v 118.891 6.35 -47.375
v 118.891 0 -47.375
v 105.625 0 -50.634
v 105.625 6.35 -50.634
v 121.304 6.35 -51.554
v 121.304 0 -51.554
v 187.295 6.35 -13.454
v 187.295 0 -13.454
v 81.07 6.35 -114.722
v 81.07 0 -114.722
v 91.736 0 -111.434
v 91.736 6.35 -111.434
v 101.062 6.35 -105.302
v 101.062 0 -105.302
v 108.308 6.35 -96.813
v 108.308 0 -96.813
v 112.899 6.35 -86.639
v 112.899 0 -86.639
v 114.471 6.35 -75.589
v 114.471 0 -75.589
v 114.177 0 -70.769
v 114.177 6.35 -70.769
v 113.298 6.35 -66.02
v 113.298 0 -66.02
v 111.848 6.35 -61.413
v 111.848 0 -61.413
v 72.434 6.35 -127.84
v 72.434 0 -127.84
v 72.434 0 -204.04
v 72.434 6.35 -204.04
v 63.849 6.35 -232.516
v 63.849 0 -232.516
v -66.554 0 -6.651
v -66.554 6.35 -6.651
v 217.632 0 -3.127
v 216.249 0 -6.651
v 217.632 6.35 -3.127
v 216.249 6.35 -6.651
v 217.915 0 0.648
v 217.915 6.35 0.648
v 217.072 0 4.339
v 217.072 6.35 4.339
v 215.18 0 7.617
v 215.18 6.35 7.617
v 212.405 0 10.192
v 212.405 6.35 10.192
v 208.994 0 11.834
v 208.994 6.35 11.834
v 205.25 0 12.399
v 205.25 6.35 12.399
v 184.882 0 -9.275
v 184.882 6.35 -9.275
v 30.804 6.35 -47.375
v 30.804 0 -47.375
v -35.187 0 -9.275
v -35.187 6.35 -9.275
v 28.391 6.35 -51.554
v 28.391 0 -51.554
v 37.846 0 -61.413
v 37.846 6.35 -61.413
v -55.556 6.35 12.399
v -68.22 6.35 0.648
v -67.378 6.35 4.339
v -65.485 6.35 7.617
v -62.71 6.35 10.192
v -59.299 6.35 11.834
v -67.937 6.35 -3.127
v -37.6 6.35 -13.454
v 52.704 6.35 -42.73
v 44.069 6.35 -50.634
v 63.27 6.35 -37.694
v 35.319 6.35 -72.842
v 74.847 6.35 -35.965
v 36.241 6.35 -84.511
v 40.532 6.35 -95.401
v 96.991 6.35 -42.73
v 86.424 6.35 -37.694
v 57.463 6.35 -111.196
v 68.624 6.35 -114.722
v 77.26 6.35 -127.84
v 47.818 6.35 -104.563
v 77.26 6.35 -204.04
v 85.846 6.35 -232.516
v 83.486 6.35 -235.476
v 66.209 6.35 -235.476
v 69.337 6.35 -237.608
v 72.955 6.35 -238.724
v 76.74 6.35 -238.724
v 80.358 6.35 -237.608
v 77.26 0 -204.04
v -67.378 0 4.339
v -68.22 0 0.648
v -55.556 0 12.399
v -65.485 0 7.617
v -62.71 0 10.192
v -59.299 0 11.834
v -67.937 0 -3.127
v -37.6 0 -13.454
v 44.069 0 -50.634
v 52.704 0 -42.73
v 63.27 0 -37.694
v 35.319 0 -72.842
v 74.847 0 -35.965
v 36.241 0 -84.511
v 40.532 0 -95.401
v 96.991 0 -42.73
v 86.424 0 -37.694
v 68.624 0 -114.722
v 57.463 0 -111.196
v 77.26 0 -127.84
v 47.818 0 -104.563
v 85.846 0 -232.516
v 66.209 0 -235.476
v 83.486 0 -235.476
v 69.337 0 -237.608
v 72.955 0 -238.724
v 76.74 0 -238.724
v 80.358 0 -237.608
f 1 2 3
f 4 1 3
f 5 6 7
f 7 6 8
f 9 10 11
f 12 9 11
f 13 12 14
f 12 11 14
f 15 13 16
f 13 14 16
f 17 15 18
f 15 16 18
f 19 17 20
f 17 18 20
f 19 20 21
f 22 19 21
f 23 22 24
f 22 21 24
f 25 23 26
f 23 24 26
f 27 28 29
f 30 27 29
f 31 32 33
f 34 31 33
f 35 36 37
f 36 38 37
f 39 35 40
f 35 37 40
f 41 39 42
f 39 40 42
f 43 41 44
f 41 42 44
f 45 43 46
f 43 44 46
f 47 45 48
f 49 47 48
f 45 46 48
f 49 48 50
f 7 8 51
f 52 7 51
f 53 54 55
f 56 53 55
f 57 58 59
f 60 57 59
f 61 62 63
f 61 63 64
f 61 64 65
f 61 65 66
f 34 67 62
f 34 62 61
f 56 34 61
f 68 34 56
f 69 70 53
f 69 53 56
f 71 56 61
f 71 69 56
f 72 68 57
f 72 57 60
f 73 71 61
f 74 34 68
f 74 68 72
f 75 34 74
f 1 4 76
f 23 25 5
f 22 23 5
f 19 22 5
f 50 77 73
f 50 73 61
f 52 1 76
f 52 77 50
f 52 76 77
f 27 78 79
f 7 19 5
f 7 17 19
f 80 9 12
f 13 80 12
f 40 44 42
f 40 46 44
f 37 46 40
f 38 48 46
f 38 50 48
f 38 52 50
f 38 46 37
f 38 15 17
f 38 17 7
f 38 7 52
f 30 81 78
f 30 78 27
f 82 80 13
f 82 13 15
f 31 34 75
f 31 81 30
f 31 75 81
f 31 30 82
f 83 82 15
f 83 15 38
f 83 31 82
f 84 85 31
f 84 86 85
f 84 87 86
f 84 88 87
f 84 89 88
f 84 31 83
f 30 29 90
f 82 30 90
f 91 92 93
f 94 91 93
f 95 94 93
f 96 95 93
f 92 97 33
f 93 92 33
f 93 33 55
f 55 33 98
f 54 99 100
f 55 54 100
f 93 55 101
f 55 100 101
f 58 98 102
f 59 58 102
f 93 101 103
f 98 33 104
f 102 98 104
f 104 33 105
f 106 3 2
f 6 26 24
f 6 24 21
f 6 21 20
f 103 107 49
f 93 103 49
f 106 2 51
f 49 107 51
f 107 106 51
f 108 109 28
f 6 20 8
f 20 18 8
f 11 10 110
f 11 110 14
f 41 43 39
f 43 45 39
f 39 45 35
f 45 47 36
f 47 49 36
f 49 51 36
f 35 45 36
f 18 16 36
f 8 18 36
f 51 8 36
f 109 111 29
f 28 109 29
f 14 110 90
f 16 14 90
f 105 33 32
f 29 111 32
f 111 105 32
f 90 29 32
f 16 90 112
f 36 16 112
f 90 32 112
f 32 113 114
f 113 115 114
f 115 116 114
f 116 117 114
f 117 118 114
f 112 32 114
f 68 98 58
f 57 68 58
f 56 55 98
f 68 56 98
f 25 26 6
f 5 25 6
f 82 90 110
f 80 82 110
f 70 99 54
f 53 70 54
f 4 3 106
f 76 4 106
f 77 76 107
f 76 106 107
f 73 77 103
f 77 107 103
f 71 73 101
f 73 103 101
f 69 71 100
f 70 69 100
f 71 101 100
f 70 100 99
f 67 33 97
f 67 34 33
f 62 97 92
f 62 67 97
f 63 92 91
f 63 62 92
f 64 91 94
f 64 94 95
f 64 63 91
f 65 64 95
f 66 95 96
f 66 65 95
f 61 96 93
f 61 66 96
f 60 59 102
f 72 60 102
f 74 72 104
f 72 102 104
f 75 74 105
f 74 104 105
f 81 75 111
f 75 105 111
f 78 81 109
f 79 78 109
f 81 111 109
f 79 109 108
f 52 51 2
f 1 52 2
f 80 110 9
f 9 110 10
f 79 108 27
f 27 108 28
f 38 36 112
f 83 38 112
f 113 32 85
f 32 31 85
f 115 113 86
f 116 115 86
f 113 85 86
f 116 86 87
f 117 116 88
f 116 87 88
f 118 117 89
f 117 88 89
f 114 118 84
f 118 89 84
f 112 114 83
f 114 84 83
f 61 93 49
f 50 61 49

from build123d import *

# Parameters (mm, degrees)
BOSS_EXTRUDE1_DEPTH = 6.35
FILLET1_R           = 12.7


with BuildPart() as part:
    # Sketch1 → Boss-Extrude1 (new body)
    with BuildSketch(Plane(origin=(0, 0, 0), x_dir=(1, 0, 0), z_dir=(0, 1, 0))):
        Polygon((74.847393185, 251.565850448), (-77.552606815, -12.398692626), (227.247393185, -12.398692626), align=None)
        with BuildLine():
            Line((68.624393185, 114.721772347), (72.434393185, 127.839947397))
            Line((72.434393185, 127.839947397), (72.434393185, 204.039947397))
            Line((72.434393185, 204.039947397), (77.260393185, 204.039947397))
            Line((77.260393185, 204.039947397), (77.260393185, 127.839947397))
            Line((77.260393185, 127.839947397), (81.070393185, 114.721772347))
            ThreePointArc((81.070393185, 114.721772347), (104.985753525, 101.313807865), (114.471393185, 75.589488399))
            ThreePointArc((114.471393185, 75.589488399), (113.810138601, 68.380754416), (111.848445192, 61.412622513))
            Line((111.848445192, 61.412622513), (121.304118037, 51.553978199))
            Line((121.304118037, 51.553978199), (187.295253805, 13.453978199))
            Line((187.295253805, 13.453978199), (184.882253805, 9.2745396))
            Line((184.882253805, 9.2745396), (118.891118037, 47.3745396))
            Line((118.891118037, 47.3745396), (105.625445192, 50.634070337))
            ThreePointArc((105.625445192, 50.634070337), (74.847393185, 35.965488399), (44.069341177, 50.634070337))
            Line((44.069341177, 50.634070337), (30.803668332, 47.3745396))
            Line((30.803668332, 47.3745396), (-35.187467436, 9.2745396))
            Line((-35.187467436, 9.2745396), (-37.600467436, 13.453978199))
            Line((-37.600467436, 13.453978199), (28.390668332, 51.553978199))
            Line((28.390668332, 51.553978199), (37.846341177, 61.412622512))
            ThreePointArc((37.846341177, 61.412622512), (40.532002585, 95.401488399), (68.624393185, 114.721772347))
        make_face(mode=Mode.SUBTRACT)
    extrude(amount=BOSS_EXTRUDE1_DEPTH)

    # Fillet1
    fillet1_edges = [part.edges().sort_by_distance(p)[0] for p in [
        (-77.552606815, 3.175, 12.398692626),
        (74.847393185, 3.175, -251.565850448),
        (227.247393185, 3.175, 12.398692626),
    ]]
    fillet(fillet1_edges, radius=FILLET1_R)


solid = part.part
